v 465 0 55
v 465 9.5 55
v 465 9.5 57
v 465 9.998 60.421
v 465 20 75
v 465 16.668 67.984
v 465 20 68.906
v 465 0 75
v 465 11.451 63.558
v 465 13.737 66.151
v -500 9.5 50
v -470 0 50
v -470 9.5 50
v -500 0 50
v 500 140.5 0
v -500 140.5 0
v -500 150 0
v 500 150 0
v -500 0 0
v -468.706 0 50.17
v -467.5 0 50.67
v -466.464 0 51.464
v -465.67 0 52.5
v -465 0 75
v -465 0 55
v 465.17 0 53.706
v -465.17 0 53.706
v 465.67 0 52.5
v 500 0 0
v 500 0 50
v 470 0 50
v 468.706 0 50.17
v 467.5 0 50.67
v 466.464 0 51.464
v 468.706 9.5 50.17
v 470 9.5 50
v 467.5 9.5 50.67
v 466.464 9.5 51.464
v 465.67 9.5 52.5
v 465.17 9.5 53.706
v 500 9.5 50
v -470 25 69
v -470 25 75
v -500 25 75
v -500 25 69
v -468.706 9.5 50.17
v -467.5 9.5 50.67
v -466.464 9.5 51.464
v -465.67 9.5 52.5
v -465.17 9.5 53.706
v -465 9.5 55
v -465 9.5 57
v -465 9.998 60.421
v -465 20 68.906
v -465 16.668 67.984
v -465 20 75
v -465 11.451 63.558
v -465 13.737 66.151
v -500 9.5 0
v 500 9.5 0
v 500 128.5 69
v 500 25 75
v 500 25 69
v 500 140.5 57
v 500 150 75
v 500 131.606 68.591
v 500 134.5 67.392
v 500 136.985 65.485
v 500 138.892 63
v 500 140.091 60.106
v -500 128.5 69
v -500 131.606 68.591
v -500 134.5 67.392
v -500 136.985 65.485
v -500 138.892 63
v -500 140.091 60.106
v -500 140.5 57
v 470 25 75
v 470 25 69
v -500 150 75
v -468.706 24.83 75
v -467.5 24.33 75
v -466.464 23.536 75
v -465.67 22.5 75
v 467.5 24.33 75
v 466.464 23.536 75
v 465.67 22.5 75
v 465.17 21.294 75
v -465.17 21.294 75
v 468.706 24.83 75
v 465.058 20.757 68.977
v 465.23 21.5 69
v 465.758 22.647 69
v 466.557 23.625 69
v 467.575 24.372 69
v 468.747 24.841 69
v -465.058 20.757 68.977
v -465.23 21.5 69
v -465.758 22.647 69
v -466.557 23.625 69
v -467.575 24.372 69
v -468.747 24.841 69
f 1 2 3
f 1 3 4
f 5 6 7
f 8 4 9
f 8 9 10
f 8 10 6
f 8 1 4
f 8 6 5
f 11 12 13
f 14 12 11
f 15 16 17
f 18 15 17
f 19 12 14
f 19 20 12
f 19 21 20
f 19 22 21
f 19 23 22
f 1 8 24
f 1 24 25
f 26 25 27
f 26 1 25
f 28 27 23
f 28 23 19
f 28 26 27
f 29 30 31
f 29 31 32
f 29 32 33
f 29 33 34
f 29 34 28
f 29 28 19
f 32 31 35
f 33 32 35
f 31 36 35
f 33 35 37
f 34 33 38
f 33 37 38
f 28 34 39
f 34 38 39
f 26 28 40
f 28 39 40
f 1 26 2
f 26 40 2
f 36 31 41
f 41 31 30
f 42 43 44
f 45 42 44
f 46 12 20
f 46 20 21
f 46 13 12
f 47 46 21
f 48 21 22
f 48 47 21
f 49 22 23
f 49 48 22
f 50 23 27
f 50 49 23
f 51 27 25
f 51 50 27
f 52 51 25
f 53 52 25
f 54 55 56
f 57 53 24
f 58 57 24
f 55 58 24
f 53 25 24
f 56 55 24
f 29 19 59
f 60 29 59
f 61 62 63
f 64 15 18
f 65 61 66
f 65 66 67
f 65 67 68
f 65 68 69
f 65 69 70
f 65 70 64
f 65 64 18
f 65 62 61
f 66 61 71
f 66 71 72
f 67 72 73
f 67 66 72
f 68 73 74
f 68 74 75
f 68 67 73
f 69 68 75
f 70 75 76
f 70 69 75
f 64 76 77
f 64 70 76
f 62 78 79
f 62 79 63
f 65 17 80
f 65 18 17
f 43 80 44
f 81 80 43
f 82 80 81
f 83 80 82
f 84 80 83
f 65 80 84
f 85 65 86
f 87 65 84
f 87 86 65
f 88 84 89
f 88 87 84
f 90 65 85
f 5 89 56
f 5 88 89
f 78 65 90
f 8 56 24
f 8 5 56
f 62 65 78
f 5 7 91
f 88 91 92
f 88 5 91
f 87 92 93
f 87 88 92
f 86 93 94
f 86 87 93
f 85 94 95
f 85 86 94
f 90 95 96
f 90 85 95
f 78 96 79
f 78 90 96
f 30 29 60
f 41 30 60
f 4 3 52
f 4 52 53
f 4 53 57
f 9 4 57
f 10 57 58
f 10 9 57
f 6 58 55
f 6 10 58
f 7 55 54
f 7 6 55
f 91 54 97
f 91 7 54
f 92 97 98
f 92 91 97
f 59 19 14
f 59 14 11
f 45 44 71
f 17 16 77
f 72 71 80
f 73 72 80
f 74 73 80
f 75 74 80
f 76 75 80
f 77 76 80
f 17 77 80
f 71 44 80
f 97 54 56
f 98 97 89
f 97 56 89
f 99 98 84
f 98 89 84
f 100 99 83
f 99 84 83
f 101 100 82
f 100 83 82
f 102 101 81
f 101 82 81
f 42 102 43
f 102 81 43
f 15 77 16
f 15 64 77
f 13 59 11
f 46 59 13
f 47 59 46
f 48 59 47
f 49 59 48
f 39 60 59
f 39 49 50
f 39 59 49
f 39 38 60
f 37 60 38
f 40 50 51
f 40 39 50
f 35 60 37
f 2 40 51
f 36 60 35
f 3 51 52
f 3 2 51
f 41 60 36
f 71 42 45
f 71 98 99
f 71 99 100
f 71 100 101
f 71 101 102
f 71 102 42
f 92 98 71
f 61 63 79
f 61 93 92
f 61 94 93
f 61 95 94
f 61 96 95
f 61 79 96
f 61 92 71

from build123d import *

# Parameters (mm, degrees)
F1_DEPTH = 500
F2_W     = 35
F2_H     = 25
F3_DEPTH = 25
F4_R     = 5


with BuildPart() as f1:
    # F0 (on Right) → F1 (new body)
    with BuildSketch(Plane.YZ):
        with BuildLine():
            Line((0, 75), (0, 0))
            Line((0, 0), (9.5, 0))
            Line((9.5, 0), (9.5, 57))
            ThreePointArc((9.5, 57), (13.014719, 65.485281), (21.5, 69))
            Line((21.5, 69), (128.5, 69))
            ThreePointArc((128.5, 69), (136.985281, 65.485281), (140.5, 57))
            Line((140.5, 57), (140.5, 0))
            Line((140.5, 0), (150, 0))
            Line((150, 0), (150, 75))
            Line((150, 75), (0, 75))
        make_face()
    extrude(amount=F1_DEPTH)

    # F2 (on Front) → F3 (cut)
    with BuildSketch(Plane.XZ):
        with Locations((482.5, 62.5)):
            Rectangle(F2_W, F2_H)
    extrude(amount=-F3_DEPTH, mode=Mode.SUBTRACT)

    # F4
    f4_edges = [f1.edges().sort_by_distance(p)[0] for p in [
        (465, 25, 72),
        (465, 4.75, 50),
    ]]
    fillet(f4_edges, radius=F4_R)

    # F5: F1 across plane


with BuildPart() as f1_1:
    add(f1.part)
    add(f1.part.mirror(Plane.YZ))


solid = f1_1.part
